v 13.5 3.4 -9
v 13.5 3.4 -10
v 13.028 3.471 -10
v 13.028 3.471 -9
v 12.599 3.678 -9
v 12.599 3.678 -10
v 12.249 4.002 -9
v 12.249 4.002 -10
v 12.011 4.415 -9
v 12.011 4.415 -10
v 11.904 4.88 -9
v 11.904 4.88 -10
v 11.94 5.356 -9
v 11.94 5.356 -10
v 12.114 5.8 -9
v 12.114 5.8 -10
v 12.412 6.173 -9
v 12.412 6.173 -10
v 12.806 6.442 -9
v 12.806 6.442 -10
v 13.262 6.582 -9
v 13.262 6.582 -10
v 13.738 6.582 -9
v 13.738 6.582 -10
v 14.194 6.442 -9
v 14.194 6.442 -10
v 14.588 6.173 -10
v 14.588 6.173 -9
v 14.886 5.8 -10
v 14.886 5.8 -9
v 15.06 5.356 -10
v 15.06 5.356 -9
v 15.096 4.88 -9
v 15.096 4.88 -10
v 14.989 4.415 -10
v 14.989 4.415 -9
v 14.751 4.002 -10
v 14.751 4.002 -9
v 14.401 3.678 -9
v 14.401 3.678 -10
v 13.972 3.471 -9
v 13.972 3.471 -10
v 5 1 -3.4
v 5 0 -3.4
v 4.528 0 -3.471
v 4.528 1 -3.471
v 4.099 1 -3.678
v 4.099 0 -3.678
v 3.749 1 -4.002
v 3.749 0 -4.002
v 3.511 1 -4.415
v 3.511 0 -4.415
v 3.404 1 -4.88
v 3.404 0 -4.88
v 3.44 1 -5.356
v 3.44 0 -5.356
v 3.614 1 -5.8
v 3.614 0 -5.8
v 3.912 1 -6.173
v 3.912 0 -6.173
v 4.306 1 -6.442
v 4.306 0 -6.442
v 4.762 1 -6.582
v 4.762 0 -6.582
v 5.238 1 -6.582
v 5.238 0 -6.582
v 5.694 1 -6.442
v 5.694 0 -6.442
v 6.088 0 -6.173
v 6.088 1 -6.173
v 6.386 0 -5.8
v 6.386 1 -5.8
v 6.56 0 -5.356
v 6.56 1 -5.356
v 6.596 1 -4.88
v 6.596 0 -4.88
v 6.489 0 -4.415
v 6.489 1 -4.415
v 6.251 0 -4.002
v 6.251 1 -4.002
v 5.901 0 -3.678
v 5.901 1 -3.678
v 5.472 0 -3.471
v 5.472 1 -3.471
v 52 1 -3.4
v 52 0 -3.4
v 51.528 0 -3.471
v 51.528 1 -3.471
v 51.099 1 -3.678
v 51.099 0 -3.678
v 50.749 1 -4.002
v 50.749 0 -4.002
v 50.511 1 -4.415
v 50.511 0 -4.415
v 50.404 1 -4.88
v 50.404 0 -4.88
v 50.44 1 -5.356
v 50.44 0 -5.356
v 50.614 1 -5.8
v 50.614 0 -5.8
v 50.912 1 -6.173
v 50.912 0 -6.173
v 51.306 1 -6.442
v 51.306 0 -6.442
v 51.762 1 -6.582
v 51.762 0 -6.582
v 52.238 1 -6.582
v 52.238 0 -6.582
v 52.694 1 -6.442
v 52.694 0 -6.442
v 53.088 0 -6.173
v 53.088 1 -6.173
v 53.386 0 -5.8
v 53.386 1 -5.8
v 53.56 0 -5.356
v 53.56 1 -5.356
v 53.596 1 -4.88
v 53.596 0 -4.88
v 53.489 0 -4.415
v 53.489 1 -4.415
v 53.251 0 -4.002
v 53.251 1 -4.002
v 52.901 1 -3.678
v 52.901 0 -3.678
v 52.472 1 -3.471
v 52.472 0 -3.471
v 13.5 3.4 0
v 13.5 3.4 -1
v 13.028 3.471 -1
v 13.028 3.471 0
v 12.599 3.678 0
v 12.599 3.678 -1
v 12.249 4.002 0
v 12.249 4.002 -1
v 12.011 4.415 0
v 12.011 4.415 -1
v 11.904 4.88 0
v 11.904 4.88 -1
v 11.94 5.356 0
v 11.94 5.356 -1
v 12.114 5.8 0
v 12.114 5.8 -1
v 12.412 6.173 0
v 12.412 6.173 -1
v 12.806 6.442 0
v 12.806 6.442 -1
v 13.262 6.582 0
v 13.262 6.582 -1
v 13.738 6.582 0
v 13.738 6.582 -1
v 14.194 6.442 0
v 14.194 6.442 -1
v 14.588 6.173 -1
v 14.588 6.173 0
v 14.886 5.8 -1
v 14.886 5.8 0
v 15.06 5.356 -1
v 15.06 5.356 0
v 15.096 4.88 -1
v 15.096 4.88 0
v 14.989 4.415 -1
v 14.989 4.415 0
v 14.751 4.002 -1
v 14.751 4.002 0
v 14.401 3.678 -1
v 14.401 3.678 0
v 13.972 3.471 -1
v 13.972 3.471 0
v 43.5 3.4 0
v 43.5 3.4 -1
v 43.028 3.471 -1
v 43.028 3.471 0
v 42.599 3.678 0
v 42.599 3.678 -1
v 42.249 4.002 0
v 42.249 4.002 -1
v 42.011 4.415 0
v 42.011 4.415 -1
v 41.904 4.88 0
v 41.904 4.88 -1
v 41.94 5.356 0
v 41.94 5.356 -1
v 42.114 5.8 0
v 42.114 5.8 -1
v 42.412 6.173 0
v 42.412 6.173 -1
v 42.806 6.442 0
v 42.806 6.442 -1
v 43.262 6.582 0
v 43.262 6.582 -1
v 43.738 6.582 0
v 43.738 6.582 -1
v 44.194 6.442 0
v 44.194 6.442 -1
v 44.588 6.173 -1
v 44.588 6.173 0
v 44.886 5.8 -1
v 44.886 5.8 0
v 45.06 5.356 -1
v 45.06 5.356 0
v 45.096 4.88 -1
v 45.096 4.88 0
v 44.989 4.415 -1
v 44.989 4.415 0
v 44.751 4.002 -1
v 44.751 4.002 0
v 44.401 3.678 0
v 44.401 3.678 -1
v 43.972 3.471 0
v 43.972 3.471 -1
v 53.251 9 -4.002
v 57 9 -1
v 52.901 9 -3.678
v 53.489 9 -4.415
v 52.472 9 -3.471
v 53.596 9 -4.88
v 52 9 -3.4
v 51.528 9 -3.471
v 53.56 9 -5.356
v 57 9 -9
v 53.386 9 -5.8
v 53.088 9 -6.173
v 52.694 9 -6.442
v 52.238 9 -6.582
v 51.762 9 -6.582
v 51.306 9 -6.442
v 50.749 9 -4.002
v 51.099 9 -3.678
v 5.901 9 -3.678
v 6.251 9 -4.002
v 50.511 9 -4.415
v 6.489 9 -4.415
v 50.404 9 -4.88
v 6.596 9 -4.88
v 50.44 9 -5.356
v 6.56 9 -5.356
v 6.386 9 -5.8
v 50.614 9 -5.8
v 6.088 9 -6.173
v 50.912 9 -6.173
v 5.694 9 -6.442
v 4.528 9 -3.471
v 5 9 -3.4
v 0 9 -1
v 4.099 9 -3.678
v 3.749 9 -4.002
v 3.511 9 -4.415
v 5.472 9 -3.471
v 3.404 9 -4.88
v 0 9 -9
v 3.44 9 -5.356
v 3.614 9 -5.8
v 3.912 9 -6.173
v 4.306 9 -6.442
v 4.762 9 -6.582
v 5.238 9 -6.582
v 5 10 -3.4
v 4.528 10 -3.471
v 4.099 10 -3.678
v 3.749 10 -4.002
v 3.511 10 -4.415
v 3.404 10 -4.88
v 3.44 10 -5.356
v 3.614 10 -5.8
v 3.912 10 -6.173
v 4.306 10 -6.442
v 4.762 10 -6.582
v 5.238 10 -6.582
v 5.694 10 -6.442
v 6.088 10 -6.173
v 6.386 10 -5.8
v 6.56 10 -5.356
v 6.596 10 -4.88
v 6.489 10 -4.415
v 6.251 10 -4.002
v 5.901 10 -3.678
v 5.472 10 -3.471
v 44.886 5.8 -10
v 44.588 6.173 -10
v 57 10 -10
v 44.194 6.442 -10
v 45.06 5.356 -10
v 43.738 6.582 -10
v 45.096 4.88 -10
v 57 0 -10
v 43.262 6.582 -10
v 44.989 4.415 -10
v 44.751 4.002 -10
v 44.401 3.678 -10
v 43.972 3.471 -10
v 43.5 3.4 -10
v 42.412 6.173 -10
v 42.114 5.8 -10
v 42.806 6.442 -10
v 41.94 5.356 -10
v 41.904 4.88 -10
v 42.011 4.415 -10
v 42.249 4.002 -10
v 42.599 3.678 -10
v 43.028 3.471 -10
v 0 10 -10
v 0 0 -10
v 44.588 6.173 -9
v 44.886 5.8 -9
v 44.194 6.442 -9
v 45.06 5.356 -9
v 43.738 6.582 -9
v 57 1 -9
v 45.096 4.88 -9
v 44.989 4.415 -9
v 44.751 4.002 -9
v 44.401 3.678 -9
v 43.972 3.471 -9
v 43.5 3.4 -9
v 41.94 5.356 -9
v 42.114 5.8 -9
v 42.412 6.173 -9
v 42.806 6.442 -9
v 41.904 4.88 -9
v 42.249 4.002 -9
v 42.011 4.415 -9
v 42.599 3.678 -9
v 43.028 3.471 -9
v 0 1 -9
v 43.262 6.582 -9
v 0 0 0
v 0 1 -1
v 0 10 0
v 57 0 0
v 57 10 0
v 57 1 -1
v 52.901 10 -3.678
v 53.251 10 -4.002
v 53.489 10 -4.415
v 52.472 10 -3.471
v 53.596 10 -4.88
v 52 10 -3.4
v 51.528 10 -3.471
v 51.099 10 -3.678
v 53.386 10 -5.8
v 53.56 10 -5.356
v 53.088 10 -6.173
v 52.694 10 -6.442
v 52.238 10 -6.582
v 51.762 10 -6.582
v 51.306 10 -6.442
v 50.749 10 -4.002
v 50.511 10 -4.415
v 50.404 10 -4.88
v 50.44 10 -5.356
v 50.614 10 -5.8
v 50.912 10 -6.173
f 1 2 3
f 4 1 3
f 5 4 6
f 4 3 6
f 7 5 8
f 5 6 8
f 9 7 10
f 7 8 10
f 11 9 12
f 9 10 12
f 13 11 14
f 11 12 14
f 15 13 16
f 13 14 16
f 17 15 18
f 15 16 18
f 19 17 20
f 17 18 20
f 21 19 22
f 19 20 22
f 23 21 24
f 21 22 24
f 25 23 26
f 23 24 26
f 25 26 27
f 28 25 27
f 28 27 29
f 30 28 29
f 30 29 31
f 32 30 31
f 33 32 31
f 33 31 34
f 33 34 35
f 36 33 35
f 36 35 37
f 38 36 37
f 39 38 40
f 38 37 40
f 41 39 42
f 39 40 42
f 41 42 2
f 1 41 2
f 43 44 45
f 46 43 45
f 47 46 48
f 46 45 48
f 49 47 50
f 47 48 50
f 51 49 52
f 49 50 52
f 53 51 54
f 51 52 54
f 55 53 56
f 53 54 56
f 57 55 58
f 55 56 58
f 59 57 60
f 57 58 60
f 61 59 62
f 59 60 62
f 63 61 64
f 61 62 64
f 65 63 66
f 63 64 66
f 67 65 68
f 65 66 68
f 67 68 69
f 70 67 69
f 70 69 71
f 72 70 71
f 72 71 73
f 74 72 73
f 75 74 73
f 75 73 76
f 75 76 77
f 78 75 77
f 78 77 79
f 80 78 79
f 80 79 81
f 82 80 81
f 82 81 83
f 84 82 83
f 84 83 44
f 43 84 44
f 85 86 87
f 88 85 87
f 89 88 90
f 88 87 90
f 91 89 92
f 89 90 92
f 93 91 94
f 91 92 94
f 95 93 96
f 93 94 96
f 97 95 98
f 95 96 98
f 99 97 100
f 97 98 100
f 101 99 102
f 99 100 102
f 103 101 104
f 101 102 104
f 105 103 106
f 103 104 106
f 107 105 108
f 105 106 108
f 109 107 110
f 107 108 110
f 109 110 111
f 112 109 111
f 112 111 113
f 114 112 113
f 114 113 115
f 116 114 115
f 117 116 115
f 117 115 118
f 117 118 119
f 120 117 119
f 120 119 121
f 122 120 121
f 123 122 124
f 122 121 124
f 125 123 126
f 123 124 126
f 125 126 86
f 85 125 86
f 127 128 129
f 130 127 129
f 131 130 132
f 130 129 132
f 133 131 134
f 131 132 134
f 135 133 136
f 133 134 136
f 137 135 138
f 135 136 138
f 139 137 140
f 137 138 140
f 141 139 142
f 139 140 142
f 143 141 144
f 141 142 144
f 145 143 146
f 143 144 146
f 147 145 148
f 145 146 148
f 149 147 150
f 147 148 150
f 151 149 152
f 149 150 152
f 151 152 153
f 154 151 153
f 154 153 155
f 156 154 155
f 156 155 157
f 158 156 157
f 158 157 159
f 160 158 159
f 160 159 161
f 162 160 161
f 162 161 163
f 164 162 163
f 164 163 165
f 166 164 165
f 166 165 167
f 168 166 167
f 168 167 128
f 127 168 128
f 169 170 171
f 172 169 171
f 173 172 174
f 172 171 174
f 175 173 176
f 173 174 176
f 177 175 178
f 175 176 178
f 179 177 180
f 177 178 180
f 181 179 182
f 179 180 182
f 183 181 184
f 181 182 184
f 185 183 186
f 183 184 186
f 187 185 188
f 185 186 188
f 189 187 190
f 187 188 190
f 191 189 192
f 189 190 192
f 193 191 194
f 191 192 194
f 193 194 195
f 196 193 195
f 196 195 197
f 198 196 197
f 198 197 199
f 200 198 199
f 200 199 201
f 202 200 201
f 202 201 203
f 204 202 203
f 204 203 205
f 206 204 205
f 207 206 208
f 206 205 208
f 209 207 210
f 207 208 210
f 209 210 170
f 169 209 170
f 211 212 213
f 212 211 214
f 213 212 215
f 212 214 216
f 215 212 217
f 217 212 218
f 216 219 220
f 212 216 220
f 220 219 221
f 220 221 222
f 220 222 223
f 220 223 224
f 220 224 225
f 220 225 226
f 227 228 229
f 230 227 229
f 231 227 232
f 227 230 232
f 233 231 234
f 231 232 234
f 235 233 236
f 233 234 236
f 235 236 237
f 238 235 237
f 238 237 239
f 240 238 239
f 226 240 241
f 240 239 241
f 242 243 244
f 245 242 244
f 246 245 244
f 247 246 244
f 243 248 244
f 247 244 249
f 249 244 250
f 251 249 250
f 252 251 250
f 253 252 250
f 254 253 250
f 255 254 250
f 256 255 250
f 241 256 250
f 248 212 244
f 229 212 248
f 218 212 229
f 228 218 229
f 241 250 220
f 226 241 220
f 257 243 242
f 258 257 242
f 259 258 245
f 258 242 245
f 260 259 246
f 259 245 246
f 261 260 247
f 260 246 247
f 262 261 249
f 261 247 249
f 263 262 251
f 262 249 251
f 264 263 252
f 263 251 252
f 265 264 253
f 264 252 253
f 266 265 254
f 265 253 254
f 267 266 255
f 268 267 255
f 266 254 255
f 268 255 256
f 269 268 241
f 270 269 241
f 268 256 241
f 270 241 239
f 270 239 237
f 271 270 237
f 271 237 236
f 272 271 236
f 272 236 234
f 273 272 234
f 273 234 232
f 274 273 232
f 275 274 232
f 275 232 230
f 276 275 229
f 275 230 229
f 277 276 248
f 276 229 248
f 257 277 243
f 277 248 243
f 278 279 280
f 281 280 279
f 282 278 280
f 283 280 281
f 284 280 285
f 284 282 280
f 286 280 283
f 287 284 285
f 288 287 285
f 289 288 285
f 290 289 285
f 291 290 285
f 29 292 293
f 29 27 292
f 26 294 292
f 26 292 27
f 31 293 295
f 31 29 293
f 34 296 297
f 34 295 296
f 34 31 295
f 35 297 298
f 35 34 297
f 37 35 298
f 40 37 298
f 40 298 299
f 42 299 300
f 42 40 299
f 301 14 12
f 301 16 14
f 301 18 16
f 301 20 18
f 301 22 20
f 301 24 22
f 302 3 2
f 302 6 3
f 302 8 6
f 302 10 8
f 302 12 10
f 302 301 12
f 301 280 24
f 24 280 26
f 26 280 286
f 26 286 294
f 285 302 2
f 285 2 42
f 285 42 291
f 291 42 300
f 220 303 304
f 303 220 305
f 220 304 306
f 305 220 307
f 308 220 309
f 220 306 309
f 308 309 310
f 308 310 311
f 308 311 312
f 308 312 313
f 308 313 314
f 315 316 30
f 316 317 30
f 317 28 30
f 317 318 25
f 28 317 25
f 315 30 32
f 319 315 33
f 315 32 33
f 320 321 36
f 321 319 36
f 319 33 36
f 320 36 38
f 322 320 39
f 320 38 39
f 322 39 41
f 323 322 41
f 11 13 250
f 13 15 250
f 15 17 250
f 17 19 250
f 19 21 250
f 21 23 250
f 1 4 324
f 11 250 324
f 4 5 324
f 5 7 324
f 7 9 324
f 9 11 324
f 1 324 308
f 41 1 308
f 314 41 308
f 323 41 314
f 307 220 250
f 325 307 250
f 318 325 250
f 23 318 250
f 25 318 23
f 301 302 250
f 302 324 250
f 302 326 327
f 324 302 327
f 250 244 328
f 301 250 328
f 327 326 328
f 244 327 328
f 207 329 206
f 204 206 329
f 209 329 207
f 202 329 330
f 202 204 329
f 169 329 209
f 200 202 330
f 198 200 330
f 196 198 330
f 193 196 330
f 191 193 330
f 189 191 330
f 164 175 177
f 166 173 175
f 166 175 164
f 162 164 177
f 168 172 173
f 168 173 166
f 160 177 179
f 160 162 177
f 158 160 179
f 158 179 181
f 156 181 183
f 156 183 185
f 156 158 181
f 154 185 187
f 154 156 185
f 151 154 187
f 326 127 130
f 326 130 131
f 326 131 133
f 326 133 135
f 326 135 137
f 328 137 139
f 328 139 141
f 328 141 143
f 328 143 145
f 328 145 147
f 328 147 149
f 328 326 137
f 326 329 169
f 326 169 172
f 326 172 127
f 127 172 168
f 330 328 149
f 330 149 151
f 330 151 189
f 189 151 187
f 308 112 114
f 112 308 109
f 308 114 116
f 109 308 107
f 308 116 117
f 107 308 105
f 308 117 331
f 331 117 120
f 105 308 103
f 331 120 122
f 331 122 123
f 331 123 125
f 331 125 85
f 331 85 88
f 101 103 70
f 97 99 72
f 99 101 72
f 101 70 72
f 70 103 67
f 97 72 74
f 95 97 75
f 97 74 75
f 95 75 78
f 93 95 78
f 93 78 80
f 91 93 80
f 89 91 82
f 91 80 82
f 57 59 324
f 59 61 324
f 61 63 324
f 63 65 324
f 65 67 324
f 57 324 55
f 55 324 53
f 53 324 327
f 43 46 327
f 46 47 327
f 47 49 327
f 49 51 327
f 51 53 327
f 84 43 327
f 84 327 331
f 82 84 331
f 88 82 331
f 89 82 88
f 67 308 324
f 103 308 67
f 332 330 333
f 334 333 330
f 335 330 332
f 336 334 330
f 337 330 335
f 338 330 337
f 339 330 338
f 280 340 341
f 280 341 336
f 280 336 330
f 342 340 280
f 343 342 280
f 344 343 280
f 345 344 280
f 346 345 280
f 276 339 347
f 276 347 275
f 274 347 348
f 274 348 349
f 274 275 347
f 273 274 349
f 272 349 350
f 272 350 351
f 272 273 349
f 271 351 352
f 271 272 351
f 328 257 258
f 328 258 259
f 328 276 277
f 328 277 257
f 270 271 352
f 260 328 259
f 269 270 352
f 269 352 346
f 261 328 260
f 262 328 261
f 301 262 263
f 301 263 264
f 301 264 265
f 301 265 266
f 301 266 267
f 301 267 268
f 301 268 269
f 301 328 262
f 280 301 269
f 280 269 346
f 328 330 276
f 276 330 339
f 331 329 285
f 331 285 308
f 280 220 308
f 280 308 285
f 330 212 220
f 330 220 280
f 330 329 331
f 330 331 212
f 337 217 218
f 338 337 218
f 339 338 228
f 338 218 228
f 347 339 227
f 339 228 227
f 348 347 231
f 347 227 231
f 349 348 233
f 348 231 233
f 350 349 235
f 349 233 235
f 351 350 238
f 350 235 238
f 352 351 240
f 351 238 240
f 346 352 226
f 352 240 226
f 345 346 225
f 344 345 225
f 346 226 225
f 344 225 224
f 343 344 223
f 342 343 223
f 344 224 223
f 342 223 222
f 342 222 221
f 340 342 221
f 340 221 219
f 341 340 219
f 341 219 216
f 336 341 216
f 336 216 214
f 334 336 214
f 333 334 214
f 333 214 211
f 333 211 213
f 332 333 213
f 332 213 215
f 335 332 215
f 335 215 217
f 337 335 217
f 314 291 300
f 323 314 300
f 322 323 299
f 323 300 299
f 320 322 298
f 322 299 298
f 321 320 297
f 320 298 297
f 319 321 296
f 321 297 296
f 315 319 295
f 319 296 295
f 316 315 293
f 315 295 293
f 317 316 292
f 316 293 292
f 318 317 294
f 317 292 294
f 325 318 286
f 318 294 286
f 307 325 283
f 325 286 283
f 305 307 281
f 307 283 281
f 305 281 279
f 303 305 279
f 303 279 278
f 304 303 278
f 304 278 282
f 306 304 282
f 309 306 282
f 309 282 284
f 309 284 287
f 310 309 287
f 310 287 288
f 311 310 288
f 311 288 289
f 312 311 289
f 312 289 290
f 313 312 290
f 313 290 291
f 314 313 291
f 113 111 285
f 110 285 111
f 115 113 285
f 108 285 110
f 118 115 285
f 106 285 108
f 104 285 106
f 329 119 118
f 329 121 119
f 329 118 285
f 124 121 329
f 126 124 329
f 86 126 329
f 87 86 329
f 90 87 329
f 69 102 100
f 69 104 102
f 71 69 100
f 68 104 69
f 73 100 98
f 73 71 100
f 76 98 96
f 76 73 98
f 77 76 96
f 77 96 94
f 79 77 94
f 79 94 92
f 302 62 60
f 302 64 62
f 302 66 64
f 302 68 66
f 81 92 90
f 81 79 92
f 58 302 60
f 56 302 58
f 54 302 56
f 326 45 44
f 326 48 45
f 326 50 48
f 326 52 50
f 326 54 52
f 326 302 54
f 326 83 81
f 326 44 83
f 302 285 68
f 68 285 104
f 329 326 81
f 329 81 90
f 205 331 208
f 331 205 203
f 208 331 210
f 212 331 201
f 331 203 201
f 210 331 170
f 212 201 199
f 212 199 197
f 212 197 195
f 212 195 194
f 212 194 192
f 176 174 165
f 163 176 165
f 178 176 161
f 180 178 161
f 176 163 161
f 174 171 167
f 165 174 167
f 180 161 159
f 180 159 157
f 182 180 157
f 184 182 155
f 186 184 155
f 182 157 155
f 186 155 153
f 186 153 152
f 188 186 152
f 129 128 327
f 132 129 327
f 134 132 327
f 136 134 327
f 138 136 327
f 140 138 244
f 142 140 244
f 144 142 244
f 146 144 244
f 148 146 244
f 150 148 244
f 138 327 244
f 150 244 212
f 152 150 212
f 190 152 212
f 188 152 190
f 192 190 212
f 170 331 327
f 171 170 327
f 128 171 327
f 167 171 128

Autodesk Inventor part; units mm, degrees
ref_plane "YZ Plane" through (0, 0, 0) normal (1, 0, 0) x (0, 1, 0)
ref_plane "XZ Plane" through (0, 0, 0) normal (0, 1, 0) x (-1, 0, 0)
ref_plane "XY Plane" through (0, 0, 0) normal (0, 0, 1) x (1, 0, 0)
sketch "スケッチ1" plane through (0, 0, 0) normal (1, 0, 0) x (0, 1, 0)
  line L0 (0, 0) -> (10, 0)
  line L1 (10, 0) -> (10, -10)
  line L2 (10, -10) -> (0, -10)
  line L3 (0, -10) -> (0, 0)
  line L4 (1, -1) -> (9, -1)
  line L5 (9, -1) -> (9, -9)
  line L6 (9, -9) -> (1, -9)
  line L7 (1, -9) -> (1, -1)
  dimension "d0" = 10
  dimension "d1" = 10
  dimension "d2" = 8
  dimension "d3" = 8
  dimension "d4" = 1
  dimension "d5" = 1
extrude "押し出し1" add sketch "スケッチ1" along normal blind 57
sketch "スケッチ2" plane through (0, 10, 0) normal (0, 1, 0) x (1, 0, 0)
  line L0 (0, 9) -> (0, 1) projected
  line L1 (0, 5) -> (120, 5)
  line L2 (57, 10) -> (57, 0) projected
  point P0 (0, 0)
  point P1 (5, 5)
  point P2 (52, 5)
  dimension "d8" = 5
  dimension "d9" = 5
hole "穴1" at (5, 10, -5) at (52, 10, -5) direction (0, -1, 0) diameter 3.2 end through all
sketch "スケッチ3" plane through (0, 0, 0) normal (0, 0, 1) x (1, 0, 0)
  line L0 (0, 0) -> (0, 10) projected
  line L1 (0, 5) -> (57, 5)
  line L2 (57, 0) -> (57, 10) projected
  point P0 (13.5, 5)
  point P1 (43.5, 5)
  point P2 (28.5, 5)
  dimension "d17" = 15
  dimension "d18" = 15
hole "穴2" at (13.5, 5, 0) at (43.5, 5, 0) direction (0, 0, -1) diameter 3.2 end through all
properties part number "link4_pipe1" material "アルミニウム 6061"
